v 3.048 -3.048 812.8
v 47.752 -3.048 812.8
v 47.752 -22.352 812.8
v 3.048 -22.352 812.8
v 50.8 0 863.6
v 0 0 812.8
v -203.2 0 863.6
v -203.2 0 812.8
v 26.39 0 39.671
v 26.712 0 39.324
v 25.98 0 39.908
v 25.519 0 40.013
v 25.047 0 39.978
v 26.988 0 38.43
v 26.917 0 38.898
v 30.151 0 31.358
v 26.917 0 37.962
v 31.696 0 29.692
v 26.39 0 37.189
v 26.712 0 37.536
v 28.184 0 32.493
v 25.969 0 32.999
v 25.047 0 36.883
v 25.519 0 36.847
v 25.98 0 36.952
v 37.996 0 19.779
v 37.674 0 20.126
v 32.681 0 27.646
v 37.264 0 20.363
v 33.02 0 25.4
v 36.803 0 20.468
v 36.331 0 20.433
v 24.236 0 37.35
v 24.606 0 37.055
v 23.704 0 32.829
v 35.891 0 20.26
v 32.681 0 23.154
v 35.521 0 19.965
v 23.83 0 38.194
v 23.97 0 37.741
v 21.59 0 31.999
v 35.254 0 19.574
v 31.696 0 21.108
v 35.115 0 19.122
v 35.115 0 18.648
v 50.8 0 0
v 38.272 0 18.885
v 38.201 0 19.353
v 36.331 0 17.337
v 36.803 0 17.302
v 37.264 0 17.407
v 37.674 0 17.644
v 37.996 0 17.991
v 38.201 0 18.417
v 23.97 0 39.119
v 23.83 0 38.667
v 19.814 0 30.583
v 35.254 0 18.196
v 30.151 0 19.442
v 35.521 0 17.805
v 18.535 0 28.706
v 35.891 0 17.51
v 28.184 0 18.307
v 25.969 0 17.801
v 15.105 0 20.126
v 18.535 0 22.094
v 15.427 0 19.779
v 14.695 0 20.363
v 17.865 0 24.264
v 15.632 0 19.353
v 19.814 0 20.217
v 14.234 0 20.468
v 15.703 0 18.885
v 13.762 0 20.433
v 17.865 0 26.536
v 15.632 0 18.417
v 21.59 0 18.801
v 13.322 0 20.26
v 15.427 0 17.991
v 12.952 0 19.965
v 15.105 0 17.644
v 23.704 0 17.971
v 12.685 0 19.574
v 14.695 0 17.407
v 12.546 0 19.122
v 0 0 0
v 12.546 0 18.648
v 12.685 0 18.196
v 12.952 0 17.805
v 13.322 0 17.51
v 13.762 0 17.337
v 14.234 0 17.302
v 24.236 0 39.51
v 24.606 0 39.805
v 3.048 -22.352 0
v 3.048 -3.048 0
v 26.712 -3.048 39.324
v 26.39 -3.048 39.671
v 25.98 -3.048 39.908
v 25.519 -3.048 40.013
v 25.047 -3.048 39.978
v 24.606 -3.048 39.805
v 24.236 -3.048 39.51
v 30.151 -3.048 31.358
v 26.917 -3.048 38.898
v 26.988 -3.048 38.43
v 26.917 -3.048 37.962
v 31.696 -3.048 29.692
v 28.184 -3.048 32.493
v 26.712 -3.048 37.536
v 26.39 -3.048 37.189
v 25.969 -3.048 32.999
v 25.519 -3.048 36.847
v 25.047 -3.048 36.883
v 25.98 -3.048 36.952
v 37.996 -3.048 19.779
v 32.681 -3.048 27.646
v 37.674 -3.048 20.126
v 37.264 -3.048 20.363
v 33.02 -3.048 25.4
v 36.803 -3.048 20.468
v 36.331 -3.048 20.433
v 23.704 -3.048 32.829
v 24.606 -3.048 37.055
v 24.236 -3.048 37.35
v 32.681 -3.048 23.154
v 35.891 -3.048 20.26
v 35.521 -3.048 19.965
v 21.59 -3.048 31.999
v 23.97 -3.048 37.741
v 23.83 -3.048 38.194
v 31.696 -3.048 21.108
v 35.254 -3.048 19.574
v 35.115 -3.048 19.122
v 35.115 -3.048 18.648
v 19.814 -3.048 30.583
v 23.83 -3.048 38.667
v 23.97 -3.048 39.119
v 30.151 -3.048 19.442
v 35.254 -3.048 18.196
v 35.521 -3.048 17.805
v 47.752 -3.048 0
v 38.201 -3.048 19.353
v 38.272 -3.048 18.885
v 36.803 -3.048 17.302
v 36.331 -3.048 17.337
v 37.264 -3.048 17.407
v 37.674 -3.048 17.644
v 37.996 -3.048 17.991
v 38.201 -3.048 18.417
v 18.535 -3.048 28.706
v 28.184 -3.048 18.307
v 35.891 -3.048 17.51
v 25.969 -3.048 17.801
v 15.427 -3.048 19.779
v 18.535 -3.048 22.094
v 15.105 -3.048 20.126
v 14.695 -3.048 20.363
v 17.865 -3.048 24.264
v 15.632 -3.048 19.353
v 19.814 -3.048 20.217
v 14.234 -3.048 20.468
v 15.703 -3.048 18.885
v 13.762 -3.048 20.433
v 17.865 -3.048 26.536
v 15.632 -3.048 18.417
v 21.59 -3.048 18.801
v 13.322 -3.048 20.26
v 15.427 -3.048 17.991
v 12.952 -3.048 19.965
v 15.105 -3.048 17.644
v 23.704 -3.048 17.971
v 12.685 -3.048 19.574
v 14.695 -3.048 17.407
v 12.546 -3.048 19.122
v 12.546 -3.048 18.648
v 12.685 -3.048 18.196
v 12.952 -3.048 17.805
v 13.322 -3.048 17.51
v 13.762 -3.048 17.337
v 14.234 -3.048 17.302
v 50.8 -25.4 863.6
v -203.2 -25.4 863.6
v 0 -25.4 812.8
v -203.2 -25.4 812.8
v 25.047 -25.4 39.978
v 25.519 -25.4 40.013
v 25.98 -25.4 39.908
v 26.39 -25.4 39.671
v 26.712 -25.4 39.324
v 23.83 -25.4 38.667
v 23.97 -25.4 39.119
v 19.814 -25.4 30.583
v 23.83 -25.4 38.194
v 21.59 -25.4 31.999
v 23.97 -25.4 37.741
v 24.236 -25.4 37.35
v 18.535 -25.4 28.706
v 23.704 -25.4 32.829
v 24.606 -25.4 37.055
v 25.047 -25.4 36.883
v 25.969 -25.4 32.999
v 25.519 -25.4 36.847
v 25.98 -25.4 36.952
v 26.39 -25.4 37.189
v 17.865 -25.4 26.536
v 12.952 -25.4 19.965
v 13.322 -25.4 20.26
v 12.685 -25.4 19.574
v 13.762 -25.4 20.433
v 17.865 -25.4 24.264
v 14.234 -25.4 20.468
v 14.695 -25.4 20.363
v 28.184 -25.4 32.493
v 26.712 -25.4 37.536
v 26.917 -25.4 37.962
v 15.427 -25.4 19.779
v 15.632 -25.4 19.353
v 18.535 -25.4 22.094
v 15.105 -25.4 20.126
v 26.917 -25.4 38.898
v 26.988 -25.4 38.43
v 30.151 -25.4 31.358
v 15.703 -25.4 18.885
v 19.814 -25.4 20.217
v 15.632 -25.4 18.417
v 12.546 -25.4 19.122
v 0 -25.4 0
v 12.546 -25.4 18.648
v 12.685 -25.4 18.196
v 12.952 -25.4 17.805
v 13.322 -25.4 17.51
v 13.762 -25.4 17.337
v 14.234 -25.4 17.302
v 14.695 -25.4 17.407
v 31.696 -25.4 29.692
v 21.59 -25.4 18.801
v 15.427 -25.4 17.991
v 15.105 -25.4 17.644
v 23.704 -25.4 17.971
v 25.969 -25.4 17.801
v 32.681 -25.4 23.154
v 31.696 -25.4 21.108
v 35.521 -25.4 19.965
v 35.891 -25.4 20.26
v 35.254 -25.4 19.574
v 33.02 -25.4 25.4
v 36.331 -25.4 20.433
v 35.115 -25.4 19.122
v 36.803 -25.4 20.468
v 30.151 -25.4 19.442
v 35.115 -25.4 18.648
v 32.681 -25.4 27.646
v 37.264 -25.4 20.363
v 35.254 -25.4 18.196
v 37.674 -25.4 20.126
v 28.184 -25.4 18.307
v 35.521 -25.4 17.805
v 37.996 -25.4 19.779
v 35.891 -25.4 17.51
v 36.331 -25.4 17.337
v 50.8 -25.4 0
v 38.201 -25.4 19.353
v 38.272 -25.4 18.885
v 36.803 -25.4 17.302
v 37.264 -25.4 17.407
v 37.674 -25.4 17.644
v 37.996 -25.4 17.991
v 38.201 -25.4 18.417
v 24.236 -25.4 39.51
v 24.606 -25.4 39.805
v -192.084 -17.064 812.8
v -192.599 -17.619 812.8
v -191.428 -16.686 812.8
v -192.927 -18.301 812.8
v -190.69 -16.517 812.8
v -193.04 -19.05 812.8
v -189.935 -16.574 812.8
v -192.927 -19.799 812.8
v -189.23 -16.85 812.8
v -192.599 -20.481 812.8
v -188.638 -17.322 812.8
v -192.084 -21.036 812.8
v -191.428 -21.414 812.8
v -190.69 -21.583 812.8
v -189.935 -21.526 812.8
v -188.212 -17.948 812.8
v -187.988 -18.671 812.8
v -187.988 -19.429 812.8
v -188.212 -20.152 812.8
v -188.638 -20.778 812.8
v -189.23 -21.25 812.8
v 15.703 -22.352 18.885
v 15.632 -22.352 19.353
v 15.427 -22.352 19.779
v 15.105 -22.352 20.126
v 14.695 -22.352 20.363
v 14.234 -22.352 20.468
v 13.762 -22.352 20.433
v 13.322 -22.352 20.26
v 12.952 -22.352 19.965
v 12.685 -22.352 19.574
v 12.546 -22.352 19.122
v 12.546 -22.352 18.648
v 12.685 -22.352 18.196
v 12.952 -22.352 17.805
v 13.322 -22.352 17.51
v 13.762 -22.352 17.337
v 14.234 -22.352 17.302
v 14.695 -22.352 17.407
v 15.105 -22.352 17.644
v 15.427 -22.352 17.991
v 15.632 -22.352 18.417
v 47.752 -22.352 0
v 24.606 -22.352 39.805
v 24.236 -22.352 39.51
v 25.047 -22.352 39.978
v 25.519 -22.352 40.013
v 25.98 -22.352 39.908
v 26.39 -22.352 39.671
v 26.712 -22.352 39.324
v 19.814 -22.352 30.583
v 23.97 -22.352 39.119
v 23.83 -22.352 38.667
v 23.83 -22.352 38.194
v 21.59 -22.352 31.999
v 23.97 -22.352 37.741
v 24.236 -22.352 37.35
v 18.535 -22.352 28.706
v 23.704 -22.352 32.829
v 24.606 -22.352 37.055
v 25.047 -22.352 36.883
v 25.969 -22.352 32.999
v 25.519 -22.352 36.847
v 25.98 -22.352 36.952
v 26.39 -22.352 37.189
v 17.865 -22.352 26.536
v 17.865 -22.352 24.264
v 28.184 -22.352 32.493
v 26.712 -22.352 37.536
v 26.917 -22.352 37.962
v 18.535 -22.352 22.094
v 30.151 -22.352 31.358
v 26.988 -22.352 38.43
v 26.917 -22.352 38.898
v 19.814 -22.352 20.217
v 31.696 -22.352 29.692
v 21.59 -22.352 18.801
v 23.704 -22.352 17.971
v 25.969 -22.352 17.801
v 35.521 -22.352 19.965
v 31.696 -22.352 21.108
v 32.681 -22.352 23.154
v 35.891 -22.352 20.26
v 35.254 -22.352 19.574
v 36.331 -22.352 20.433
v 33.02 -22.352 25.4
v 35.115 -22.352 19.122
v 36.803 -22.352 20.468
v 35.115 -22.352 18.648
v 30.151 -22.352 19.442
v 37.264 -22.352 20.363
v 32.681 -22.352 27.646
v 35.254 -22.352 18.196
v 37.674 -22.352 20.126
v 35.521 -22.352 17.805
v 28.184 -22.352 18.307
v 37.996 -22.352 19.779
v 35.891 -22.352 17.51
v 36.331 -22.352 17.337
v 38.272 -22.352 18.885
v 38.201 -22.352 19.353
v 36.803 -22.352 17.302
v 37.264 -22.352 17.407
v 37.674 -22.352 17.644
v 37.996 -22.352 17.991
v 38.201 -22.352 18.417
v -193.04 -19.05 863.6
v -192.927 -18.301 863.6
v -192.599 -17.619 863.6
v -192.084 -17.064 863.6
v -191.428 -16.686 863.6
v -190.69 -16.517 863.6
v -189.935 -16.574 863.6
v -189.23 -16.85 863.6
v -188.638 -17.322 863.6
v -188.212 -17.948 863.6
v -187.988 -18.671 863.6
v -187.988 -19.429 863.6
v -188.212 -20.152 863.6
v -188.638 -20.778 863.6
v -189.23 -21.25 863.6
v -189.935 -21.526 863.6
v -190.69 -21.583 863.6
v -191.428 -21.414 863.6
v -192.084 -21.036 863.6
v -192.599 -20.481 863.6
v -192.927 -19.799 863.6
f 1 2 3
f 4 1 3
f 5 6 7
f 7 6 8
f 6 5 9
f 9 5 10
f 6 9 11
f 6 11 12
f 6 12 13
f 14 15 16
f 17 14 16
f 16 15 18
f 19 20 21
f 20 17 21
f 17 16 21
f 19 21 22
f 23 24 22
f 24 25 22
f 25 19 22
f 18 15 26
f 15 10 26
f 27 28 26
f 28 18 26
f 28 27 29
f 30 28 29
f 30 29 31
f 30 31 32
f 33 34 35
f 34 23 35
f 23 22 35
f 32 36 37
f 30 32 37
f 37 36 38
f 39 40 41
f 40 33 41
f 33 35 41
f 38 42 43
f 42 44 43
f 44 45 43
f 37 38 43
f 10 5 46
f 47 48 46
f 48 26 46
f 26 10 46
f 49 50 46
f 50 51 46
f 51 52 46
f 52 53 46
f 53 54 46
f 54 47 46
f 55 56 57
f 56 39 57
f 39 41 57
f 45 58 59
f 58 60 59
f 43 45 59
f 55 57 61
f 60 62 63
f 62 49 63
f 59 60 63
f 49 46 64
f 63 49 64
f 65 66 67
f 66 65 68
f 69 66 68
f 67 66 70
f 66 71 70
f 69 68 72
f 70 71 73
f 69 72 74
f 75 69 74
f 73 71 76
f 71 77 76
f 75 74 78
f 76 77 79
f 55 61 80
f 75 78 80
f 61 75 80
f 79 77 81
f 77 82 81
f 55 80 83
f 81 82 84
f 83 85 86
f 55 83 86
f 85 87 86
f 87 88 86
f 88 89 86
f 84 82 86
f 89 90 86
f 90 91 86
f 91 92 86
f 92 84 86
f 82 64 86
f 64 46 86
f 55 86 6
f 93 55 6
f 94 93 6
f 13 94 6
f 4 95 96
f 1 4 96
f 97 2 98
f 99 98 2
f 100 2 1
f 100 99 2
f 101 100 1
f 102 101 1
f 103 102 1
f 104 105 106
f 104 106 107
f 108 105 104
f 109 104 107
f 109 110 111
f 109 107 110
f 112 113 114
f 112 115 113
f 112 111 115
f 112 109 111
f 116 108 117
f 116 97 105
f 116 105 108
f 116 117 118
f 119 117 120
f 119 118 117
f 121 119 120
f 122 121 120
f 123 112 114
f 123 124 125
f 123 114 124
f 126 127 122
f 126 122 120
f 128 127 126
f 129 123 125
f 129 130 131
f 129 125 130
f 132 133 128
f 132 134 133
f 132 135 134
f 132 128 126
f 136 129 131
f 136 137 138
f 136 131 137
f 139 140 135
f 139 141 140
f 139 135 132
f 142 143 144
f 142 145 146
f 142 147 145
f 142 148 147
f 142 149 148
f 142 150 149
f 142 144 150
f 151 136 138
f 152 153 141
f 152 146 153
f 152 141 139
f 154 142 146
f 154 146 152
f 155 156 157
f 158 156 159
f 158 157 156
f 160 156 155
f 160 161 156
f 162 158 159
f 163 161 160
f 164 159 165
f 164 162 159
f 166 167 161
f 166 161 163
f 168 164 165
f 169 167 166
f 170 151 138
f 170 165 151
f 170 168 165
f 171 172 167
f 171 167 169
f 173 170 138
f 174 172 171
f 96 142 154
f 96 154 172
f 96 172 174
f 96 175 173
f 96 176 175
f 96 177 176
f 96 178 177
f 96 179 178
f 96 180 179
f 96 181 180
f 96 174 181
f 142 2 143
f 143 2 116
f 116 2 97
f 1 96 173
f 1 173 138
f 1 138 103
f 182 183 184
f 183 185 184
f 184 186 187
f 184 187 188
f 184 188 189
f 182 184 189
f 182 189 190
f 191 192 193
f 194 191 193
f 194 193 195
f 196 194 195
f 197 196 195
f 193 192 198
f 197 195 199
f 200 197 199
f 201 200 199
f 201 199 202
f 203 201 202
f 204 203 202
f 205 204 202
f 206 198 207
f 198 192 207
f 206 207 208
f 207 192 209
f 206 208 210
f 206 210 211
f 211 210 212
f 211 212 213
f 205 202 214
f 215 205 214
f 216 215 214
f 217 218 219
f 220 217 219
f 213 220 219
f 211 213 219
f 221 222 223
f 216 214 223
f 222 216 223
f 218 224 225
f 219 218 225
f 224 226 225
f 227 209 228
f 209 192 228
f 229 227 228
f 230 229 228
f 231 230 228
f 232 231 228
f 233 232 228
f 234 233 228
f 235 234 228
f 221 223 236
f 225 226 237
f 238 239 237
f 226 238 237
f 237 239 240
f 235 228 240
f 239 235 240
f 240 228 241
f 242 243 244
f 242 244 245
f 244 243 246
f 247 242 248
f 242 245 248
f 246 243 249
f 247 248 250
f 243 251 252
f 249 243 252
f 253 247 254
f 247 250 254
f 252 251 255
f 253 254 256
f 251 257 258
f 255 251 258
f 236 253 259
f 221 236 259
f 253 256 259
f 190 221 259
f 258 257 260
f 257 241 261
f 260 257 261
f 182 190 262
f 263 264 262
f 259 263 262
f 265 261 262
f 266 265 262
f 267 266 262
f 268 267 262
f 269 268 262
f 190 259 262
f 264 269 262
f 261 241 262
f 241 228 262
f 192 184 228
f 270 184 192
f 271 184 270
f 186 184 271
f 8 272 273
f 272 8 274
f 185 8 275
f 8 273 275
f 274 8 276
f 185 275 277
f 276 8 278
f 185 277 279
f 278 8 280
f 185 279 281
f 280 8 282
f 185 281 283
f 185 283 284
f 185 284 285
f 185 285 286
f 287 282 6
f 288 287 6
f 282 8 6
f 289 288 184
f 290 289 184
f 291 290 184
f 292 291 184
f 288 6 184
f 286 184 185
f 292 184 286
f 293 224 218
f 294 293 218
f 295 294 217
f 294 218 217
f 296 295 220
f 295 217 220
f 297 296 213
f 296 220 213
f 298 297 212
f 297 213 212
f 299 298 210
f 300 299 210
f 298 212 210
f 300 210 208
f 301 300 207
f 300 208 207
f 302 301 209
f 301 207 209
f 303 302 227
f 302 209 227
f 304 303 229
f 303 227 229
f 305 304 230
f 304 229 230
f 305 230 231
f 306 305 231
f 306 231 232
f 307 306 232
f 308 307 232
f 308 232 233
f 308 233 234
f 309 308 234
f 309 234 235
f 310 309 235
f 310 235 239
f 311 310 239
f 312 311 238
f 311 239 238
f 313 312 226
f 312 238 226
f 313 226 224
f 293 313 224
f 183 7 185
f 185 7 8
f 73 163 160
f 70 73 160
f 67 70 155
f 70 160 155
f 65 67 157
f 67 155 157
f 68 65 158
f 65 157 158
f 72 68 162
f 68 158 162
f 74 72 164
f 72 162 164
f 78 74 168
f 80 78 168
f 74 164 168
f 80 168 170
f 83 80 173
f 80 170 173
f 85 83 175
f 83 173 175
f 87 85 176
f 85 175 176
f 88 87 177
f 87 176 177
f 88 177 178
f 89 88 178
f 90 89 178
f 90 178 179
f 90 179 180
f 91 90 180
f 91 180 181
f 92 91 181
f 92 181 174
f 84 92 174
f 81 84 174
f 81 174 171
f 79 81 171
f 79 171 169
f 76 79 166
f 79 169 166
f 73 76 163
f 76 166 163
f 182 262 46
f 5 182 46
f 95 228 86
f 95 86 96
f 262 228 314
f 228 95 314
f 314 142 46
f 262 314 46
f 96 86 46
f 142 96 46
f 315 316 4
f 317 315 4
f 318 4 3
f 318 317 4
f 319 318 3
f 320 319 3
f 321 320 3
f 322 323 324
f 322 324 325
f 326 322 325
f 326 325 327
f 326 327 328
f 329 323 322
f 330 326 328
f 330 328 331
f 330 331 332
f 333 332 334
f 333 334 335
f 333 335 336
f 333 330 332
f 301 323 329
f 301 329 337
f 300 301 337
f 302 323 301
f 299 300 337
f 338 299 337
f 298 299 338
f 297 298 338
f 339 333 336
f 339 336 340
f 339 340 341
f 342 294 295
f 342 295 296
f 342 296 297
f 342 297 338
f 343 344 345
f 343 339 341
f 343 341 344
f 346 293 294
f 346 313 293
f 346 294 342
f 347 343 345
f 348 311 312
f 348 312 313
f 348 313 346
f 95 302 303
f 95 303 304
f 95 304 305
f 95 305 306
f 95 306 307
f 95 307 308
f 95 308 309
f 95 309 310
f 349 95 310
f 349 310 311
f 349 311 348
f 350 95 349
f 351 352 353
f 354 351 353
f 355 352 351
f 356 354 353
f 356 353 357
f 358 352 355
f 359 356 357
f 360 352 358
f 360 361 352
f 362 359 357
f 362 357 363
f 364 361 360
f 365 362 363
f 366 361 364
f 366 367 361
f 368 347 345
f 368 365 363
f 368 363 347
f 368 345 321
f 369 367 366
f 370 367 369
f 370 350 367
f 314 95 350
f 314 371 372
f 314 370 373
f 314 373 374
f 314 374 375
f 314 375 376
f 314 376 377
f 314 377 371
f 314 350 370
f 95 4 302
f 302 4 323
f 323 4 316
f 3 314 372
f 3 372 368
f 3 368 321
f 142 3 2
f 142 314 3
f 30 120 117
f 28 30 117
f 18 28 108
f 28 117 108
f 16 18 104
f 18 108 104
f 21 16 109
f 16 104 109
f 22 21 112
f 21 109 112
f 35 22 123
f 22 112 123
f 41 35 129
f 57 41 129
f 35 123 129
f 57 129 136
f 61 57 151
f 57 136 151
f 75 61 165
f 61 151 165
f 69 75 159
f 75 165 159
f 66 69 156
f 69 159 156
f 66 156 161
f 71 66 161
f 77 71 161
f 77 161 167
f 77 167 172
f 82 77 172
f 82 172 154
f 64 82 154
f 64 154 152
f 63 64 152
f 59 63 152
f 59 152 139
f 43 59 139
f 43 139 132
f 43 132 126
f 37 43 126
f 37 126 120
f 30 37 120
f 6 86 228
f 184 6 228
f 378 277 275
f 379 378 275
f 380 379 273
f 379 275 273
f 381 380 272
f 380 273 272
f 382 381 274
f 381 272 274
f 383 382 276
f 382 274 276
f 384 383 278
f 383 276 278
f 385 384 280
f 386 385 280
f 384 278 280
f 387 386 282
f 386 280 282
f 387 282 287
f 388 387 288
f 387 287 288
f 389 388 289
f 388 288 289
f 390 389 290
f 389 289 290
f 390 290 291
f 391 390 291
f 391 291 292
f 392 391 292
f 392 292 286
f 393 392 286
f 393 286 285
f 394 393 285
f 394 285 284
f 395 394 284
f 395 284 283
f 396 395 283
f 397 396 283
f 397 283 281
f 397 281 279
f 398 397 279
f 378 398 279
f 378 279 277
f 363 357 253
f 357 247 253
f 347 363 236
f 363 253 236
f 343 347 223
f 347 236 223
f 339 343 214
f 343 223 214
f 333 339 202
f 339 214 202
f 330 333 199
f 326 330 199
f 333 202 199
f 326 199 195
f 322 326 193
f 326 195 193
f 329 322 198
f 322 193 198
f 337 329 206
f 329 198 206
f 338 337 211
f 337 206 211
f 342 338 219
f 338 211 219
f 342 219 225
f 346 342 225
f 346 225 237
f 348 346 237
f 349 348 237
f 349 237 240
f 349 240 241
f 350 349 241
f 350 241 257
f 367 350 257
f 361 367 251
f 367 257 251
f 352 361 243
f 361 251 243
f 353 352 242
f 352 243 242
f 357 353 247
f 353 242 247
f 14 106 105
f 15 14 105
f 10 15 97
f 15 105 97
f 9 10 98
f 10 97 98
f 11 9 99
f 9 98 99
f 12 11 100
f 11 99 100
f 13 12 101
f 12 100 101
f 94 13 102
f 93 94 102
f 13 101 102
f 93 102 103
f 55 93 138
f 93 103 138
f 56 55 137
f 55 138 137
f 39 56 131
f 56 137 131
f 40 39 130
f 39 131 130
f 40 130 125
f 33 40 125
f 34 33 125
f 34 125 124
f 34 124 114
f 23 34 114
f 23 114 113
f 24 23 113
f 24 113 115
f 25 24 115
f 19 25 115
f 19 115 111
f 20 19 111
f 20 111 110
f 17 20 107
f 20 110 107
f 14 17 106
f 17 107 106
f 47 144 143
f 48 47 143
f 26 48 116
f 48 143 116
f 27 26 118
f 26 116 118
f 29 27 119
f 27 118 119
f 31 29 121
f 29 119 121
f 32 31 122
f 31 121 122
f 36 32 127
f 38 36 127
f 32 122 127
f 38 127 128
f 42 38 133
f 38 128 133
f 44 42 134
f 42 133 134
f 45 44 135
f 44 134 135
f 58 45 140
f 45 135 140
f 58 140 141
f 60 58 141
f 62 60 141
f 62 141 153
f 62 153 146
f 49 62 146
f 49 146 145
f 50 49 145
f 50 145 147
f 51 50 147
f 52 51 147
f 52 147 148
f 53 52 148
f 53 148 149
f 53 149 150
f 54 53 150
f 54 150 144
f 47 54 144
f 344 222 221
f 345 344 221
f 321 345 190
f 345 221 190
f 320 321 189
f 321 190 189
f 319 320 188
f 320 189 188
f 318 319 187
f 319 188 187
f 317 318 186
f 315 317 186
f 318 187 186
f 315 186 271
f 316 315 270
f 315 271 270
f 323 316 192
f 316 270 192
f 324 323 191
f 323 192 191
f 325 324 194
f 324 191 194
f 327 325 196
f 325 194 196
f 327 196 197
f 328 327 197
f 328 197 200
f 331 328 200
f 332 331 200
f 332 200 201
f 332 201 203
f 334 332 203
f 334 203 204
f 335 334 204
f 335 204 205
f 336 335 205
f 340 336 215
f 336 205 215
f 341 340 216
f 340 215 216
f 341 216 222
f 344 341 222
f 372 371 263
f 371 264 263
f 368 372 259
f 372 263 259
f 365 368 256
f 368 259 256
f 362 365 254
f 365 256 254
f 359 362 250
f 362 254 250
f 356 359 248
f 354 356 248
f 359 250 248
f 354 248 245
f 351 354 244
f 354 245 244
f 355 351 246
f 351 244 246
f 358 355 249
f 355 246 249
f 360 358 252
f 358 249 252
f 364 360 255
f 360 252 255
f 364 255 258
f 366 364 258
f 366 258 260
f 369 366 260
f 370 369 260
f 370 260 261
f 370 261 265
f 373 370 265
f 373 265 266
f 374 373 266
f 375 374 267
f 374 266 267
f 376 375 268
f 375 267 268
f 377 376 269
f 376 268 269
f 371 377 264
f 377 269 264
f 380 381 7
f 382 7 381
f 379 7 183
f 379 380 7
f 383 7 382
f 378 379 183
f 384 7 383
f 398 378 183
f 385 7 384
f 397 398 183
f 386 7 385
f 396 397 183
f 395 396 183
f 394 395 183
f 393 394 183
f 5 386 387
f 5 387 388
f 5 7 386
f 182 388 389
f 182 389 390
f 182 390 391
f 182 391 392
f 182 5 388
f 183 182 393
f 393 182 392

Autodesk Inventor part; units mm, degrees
ref_plane "YZ Plane" through (0, 0, 0) normal (1, 0, 0) x (0, 1, 0)
ref_plane "XZ Plane" through (0, 0, 0) normal (0, 1, 0) x (-1, 0, 0)
ref_plane "XY Plane" through (0, 0, 0) normal (0, 0, 1) x (1, 0, 0)
sketch "Sketch1" plane through (0, 0, 0) normal (0, 0, 1) x (1, 0, 0)
  line L0 (0, 0) -> (0, -25.4)
  line L1 (0, -25.4) -> (50.8, -25.4)
  line L2 (50.8, -25.4) -> (50.8, 0)
  line L3 (50.8, 0) -> (0, 0)
  line L4 (0, -25.4) -> (1.524, -25.4)
  line L5 (3.048, -22.352) -> (47.752, -22.352)
  line L6 (50.8, -25.4) -> (23.876, -25.4)
  line L7 (47.752, -22.352) -> (47.752, -3.048)
  line L8 (50.8, 0) -> (50.8, -1.524)
  line L9 (47.752, -3.048) -> (3.048, -3.048)
  line L10 (0, 0) -> (1.524, 0)
  line L11 (3.048, -22.352) -> (3.048, -3.048)
  dimension "d53" = 25.4
  dimension "d54" = 50.8
  dimension "d55" = 3.048
  dimension "d56" = 3.048
  dimension "d57" = 3.048
  dimension "d58" = 3.048
extrude "Extrusion1" add sketch "Sketch1" along normal blind 812.8
sketch "Sketch2" plane through (50.8, -25.4, 0) normal (1, 0, 0) x (0, 0, -1)
  line L0 (-812.8, 25.4) -> (-812.8, 0) projected
  line L1 (-812.8, 25.4) -> (-863.6, 25.4)
  line L2 (-863.6, 25.4) -> (-863.6, 0)
  line L3 (-863.6, 0) -> (-812.8, 0)
  line L4 (0, 0) -> (-812.8, 0) projected
  line L5 (-812.8, 25.4) -> (-812.8, 0)
  line L6 (-812.8, 0) -> (-815.848, 0)
  line L7 (-815.848, 3.048) -> (-815.848, 47.752)
  line L8 (-812.8, 25.4) -> (-812.8, 22.352)
  line L9 (-815.848, 47.752) -> (-860.552, 47.752)
  line L10 (-863.6, 25.4) -> (-860.552, 25.4)
  line L11 (-863.6, 0) -> (-863.6, 3.048)
  line L12 (-860.552, 3.048) -> (-815.848, 3.048)
  line L13 (-860.552, 47.752) -> (-860.552, 3.048)
  point P0 (0, 25.4)
extrude "Extrusion2" add sketch "Sketch2" against normal blind 254 contours L0 L3 L2 L1 L13 L12 L7 | L7 L12 L13 L1
sketch "Sketch3" plane through (0, -25.4, 0) normal (0, -1, 0) x (1, 0, 0)
  line L0 (0, 0) -> (50.8, 0) projected
  line L1 (50.8, 0) -> (0, 0)
  circle A0 centre (25.4, 25.4) radius 7.62
  circle A1 centre (25.4, 38.4302) radius 1.5875
  circle A2 centre (14.1155, 18.8849) radius 1.5875
  circle A3 centre (36.6845, 18.8849) radius 1.5875
  dimension "d23" = 360
extrude "Extrusion3" cut sketch "Sketch3" against normal blind 254
sketch "Sketch12" plane through (0, -25.4, 812.8) normal (0, 0, -1) x (-1, 0, 0)
  circle A0 centre (190.5, 6.35) radius 2.54
  line L0 (0, 25.4) -> (203.2, 25.4) projected
  line L1 (203.2, 25.4) -> (203.2, 0) projected
  dimension "d70" = 5.08
  dimension "d71" = 19.05
  dimension "d72" = 12.7
extrude "Extrusion10" cut sketch "Sketch12" against normal through all
sketch "Sketch13" plane through (0, -25.4, 0) normal (0, -1, 0) x (1, 0, 0)
  line L0 (50.8, 431.7892) -> (3.048, 431.7892)
  line L1 (0, 431.7892) -> (50.8, 431.7892)
  line L2 (50.8, 431.7892) -> (50.8, 457.1892)
  line L3 (50.8, 457.1892) -> (0, 457.1892)
  line L4 (0, 457.1892) -> (0, 431.7892)
  point P0 (50.8, 0)
sketch "Sketch14" plane through (0, 0, 0) normal (0, 1, 0) x (1, 0, 0)
  line L0 (50.8, -431.8) -> (0, -431.8)
  line L1 (50.8, -431.8) -> (50.8, -457.2)
  line L2 (50.8, -457.2) -> (0, -457.2)
  line L3 (0, -457.2) -> (0, -431.8)
  dimension "d78" = 25.4
properties part number "arm2v2" material "Aluminum 6061"
